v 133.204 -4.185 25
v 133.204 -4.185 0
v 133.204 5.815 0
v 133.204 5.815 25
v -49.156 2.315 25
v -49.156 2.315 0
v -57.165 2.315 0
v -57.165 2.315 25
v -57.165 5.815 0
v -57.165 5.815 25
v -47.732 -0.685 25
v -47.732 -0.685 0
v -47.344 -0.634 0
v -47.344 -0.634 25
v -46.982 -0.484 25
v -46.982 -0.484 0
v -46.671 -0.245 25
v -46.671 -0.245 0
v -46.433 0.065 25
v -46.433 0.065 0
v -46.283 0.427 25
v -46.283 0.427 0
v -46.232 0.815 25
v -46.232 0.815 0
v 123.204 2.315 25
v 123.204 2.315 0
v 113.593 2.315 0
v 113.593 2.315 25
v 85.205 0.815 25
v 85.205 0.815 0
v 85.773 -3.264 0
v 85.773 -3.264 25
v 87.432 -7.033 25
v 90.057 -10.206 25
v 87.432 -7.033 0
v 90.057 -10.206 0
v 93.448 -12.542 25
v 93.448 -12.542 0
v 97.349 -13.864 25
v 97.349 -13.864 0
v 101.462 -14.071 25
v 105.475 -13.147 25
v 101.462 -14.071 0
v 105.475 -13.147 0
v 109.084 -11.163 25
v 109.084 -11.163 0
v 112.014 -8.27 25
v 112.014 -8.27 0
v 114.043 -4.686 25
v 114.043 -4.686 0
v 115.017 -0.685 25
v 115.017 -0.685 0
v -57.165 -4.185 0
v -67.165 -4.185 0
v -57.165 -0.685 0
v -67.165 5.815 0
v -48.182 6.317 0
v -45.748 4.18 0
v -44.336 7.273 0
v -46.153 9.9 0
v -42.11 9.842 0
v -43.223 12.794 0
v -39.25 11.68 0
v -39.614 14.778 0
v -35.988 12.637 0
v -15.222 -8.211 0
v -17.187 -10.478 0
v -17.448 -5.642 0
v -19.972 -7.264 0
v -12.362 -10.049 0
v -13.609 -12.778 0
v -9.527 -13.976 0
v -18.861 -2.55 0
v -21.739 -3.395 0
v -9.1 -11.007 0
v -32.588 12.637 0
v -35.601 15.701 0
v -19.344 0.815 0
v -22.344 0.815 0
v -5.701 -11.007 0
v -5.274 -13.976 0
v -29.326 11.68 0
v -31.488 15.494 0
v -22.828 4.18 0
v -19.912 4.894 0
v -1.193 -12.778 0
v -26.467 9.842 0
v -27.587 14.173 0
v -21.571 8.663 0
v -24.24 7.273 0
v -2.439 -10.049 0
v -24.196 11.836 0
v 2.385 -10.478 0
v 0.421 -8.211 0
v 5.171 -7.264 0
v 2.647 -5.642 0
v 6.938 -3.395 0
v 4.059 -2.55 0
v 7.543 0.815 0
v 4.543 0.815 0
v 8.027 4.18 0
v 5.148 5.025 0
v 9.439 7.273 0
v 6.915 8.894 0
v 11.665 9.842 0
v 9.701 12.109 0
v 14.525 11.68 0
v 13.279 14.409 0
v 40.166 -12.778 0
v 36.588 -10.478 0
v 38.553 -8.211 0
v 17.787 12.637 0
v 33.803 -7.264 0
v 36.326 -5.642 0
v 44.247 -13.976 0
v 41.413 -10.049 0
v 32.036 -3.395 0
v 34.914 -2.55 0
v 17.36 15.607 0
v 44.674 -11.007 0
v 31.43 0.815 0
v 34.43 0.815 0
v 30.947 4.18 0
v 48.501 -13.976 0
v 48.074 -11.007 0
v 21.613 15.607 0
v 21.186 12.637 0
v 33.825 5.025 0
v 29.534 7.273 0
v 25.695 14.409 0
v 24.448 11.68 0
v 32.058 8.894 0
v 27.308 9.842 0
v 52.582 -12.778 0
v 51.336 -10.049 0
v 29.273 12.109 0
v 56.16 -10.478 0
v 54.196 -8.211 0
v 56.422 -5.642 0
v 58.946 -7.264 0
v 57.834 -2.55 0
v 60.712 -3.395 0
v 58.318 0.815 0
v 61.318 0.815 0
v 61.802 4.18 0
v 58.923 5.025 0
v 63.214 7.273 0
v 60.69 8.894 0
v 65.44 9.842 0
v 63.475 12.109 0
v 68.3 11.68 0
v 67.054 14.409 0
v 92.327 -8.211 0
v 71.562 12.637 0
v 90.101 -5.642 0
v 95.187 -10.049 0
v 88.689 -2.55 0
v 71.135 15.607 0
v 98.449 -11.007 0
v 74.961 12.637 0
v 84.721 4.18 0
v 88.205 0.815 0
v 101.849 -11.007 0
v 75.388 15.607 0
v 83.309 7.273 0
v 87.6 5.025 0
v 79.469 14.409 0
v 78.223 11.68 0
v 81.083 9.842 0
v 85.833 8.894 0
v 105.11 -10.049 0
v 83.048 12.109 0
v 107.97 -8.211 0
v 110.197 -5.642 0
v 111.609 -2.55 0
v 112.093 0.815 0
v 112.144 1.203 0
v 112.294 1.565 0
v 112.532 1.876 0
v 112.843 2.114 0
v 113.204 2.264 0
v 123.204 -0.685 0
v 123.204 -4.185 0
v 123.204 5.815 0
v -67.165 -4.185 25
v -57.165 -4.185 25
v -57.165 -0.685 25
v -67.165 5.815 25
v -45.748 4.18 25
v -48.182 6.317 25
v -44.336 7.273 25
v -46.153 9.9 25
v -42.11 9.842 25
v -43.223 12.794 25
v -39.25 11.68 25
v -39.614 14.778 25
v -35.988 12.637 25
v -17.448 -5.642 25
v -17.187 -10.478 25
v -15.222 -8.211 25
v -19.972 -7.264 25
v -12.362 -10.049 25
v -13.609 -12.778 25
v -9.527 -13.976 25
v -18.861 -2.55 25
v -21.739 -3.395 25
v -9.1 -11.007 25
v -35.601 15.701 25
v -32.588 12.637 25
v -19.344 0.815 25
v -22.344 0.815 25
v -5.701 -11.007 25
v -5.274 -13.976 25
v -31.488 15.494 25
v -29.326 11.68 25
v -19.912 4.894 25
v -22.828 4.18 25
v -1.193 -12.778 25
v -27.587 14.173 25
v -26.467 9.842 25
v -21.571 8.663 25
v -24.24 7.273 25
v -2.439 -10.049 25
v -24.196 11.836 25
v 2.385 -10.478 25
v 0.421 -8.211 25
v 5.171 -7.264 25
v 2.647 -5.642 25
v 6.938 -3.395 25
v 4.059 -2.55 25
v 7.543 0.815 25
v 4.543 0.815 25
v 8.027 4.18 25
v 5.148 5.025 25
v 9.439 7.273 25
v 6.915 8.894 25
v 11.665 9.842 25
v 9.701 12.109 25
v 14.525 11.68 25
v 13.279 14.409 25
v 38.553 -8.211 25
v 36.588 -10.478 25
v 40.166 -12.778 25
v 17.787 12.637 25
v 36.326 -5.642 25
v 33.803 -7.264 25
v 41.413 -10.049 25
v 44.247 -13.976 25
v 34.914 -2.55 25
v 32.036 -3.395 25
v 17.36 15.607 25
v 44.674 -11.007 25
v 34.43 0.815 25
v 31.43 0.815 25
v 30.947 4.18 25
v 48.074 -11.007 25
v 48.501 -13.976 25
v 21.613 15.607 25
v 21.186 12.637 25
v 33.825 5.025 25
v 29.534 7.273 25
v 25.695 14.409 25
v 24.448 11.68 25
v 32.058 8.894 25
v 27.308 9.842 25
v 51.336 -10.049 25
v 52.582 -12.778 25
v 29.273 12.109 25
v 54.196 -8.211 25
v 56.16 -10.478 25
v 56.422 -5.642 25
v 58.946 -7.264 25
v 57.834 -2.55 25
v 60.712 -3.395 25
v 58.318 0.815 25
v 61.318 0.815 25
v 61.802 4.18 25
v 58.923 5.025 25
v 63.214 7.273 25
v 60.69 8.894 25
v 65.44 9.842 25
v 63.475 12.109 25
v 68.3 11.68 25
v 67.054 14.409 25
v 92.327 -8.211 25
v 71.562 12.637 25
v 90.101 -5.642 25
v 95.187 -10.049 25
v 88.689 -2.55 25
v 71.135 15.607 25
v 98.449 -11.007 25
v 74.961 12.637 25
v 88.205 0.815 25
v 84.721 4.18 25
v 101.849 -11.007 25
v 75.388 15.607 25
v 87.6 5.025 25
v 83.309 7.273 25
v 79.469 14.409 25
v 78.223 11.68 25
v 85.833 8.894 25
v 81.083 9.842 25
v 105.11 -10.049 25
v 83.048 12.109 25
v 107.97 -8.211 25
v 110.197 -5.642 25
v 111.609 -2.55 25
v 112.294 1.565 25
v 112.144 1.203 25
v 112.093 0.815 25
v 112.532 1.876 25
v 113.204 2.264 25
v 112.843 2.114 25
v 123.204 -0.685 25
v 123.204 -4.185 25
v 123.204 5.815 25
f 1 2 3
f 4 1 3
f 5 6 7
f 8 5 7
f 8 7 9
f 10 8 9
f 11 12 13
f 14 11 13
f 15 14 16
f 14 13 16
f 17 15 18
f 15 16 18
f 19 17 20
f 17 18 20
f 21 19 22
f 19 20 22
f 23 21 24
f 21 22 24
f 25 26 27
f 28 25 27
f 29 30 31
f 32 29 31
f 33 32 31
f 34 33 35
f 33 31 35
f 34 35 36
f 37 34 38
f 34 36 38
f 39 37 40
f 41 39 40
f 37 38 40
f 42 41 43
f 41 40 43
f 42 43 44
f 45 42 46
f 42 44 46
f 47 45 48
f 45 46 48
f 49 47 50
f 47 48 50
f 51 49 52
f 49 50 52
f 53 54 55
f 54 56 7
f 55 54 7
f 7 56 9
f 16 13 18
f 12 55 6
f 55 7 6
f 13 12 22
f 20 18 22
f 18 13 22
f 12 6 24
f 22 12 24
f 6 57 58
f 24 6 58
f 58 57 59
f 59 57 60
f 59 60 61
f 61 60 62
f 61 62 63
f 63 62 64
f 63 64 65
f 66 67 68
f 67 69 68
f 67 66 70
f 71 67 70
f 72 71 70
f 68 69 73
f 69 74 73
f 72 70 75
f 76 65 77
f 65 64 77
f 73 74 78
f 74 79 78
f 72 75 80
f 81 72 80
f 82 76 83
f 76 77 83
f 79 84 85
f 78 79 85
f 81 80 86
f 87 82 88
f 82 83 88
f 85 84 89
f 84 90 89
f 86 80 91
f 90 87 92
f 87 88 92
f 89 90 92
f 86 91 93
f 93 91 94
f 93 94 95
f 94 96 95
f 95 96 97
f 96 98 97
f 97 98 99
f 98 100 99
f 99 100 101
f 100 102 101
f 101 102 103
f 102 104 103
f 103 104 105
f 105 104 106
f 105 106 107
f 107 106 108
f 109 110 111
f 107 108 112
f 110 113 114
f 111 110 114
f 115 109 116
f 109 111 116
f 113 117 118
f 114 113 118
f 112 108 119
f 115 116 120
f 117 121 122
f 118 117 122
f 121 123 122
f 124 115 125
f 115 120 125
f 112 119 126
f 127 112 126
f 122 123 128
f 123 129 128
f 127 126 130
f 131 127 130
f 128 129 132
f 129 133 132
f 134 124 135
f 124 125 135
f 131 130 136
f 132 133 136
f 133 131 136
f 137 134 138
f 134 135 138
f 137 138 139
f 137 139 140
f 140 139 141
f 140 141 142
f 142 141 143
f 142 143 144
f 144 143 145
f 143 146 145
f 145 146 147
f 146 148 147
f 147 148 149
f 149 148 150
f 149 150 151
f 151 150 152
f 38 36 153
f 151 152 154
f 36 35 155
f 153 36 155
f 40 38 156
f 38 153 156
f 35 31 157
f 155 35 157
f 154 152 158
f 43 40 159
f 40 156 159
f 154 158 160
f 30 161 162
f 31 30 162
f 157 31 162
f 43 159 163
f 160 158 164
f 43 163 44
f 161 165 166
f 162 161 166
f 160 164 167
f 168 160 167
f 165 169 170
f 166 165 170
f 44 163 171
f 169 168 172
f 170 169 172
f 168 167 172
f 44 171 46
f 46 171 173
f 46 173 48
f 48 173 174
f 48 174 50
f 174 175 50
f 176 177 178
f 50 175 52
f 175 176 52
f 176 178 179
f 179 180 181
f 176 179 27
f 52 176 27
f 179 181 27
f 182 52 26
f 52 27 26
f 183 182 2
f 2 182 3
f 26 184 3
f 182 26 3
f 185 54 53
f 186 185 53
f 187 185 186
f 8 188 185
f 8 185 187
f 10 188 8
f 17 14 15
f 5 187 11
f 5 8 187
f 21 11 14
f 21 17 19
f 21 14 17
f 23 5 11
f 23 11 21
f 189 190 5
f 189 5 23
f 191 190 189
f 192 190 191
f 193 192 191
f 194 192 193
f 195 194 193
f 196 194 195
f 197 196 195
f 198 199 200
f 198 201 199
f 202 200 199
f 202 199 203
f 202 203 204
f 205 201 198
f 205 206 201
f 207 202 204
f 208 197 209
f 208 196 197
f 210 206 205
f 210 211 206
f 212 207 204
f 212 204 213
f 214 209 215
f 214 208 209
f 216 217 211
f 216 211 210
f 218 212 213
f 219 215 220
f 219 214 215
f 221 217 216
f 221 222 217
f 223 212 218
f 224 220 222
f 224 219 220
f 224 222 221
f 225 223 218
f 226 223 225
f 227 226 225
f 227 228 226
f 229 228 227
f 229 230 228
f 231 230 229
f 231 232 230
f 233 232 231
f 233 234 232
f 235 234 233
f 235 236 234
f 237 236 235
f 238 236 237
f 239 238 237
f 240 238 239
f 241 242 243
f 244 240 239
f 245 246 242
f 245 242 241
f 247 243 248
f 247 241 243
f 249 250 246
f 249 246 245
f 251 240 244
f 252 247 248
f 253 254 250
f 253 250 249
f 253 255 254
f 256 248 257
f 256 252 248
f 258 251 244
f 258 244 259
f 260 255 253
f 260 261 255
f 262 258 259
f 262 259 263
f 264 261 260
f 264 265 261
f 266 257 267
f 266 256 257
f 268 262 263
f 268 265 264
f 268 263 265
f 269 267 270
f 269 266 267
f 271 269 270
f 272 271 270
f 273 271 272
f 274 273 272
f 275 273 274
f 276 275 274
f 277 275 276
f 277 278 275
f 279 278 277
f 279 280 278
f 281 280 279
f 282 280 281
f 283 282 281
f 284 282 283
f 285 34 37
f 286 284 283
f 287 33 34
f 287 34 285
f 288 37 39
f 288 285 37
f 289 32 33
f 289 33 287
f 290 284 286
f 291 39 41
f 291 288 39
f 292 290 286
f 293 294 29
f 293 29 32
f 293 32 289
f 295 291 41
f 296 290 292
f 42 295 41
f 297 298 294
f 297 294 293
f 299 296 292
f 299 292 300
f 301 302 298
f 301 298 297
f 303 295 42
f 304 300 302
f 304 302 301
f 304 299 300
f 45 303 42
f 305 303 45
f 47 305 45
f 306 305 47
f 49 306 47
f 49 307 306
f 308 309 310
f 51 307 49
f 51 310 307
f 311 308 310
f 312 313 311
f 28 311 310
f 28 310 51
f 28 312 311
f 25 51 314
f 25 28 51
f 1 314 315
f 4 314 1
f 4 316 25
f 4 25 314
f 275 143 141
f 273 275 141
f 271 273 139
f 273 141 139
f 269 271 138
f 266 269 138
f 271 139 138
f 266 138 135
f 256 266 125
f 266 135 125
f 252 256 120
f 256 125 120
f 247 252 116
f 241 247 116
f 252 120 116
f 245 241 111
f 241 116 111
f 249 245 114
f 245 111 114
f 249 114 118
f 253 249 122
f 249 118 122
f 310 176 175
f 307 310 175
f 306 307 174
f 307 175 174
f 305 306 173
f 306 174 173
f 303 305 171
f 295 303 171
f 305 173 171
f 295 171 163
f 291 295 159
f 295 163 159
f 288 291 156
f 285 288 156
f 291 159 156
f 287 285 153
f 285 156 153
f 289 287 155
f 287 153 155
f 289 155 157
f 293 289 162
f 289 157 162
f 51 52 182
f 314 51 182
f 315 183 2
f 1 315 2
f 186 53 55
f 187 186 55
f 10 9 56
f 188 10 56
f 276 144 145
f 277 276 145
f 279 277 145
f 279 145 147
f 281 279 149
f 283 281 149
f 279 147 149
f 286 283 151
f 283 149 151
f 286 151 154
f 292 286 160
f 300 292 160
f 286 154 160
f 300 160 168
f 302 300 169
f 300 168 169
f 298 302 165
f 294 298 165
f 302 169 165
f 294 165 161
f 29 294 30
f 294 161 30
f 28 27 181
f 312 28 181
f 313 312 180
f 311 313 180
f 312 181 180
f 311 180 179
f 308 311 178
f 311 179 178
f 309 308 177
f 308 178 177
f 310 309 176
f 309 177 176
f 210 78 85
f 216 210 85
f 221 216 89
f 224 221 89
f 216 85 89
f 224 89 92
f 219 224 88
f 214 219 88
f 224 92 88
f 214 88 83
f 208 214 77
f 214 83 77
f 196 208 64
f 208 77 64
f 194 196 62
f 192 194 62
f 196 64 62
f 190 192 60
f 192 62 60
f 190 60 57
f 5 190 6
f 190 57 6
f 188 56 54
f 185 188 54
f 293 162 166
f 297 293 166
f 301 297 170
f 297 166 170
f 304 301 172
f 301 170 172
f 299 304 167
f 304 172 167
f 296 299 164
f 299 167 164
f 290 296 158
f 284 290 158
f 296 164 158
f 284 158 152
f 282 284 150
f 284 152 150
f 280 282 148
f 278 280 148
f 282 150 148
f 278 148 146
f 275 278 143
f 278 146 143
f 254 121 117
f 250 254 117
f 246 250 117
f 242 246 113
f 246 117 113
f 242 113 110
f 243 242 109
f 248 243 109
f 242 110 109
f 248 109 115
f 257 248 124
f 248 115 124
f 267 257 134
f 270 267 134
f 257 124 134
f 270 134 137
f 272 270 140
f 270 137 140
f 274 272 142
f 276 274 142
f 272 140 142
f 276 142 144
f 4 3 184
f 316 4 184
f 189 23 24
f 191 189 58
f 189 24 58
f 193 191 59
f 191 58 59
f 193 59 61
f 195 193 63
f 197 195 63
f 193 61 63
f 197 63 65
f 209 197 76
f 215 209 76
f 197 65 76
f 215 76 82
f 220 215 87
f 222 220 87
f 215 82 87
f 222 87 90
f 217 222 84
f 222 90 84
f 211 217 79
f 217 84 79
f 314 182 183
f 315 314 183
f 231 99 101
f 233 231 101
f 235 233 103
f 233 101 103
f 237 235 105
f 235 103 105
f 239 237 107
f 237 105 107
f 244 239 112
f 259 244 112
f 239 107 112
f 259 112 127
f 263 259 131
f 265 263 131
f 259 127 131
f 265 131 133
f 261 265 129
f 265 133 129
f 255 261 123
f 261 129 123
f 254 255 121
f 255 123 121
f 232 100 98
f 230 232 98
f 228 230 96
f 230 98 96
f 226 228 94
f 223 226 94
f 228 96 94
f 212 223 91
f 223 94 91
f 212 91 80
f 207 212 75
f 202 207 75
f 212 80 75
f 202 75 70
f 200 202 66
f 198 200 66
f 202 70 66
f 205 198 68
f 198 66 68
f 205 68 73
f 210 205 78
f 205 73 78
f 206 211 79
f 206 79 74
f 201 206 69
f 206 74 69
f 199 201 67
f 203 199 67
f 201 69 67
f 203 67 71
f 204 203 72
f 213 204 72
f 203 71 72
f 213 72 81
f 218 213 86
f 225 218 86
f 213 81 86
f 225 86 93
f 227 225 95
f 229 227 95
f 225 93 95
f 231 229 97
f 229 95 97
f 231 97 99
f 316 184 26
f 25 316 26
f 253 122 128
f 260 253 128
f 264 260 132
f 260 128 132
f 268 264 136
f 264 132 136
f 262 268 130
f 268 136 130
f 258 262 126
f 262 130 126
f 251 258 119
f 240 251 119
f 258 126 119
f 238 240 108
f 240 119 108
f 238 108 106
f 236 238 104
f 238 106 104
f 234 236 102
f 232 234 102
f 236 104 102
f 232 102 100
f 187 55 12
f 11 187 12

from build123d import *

# Parameters (mm, degrees)
F1_DEPTH = 25


with BuildPart() as f1:
    # F0 (on Top) → F1 (new body)
    with BuildSketch(Plane.XY):
        with BuildLine():
            ThreePointArc((-49.1562802567, 2.3152595113), (-49.2128732163, 1.5662082781), (-49.2317534387, 0.8152595113))
            Line((-49.2317534387, 0.8152595113), (-47.7317534387, 0.8152595113))
            ThreePointArc((-47.7317534387, 0.8152595113), (-47.7108165454, 1.5652595113), (-47.6480710788, 2.3129234465))
            ThreePointArc((-47.6480710788, 2.3129234465), (-47.6898959586, 2.3146753814), (-47.7317534387, 2.3152595113))
            Line((-47.7317534387, 2.3152595113), (-49.1562802567, 2.3152595113))
        make_face()
        with BuildLine():
            Line((-47.7317534387, 0.8152595113), (-49.2317534387, 0.8152595113))
            ThreePointArc((-49.2317534387, 0.8152595113), (-48.7924136105, -0.2454006604), (-47.7317534387, -0.6847404887))
            ThreePointArc((-47.7317534387, -0.6847404887), (-46.6710932669, -0.2454006604), (-46.2317534387, 0.8152595113))
            ThreePointArc((-46.2317534387, 0.8152595113), (-46.6419086012, 1.8459089328), (-47.6480710788, 2.3129234465))
            ThreePointArc((-47.6480710788, 2.3129234465), (-47.7108165454, 1.5652595113), (-47.7317534387, 0.8152595113))
        make_face()
        with BuildLine():
            ThreePointArc((-47.7317534387, -0.6847404887), (-48.7924136105, -0.2454006604), (-49.2317534387, 0.8152595113))
            ThreePointArc((-49.2317534387, 0.8152595113), (-49.2128732163, 1.5662082781), (-49.1562802567, 2.3152595113))
            Line((-49.1562802567, 2.3152595113), (-57.1654987335, 2.3152595113))
            Line((-57.1654987335, 2.3152595113), (-57.1654987335, 5.8152595113))
            Line((-57.1654987335, 5.8152595113), (-67.1654987335, 5.8152595113))
            Line((-67.1654987335, 5.8152595113), (-67.1654987335, -4.1847404887))
            Line((-67.1654987335, -4.1847404887), (-57.1654987335, -4.1847404887))
            Line((-57.1654987335, -4.1847404887), (-57.1654987335, -0.6847404887))
            Line((-57.1654987335, -0.6847404887), (-47.7317534387, -0.6847404887))
        make_face()
        with BuildLine():
            ThreePointArc((-19.3443664014, 0.8152595113), (-33.5371111533, 15.7400728076), (-49.1562802567, 2.3152595113))
            Line((-49.1562802567, 2.3152595113), (-47.7317534387, 2.3152595113))
            ThreePointArc((-47.7317534387, 2.3152595113), (-47.6898959586, 2.3146753814), (-47.6480710788, 2.3129234465))
            ThreePointArc((-47.6480710788, 2.3129234465), (-34.2880599201, 14.25895303), (-20.9280487614, 2.3129234465))
            ThreePointArc((-20.9280487614, 2.3129234465), (-19.8137169799, 1.9051043489), (-19.3443664014, 0.8152595113))
        make_face()
        with BuildLine():
            ThreePointArc((-20.9280487614, 2.3129234465), (-34.2880599201, 14.25895303), (-47.6480710788, 2.3129234465))
            ThreePointArc((-47.6480710788, 2.3129234465), (-46.6419086012, 1.8459089328), (-46.2317534387, 0.8152595113))
            ThreePointArc((-46.2317534387, 0.8152595113), (-34.2880599201, 12.75895303), (-22.3443664014, 0.8152595113))
            ThreePointArc((-22.3443664014, 0.8152595113), (-21.934211239, 1.8459089328), (-20.9280487614, 2.3129234465))
        make_face()
        with BuildLine():
            ThreePointArc((4.5430206358, 0.8152595113), (-7.4006728828, -11.1284340073), (-19.3443664014, 0.8152595113))
            ThreePointArc((-19.3443664014, 0.8152595113), (-19.7545215639, -0.2153899102), (-20.7606840415, -0.6824044238))
            ThreePointArc((-20.7606840415, -0.6824044238), (-7.4006728828, -12.6284340073), (5.9593382759, -0.6824044238))
            ThreePointArc((5.9593382759, -0.6824044238), (4.9531757983, -0.2153899102), (4.5430206358, 0.8152595113))
        make_face()
        with BuildLine():
            ThreePointArc((-20.7606840415, -0.6824044238), (-19.7545215639, -0.2153899102), (-19.3443664014, 0.8152595113))
            ThreePointArc((-19.3443664014, 0.8152595113), (-19.8137169799, 1.9051043489), (-20.9280487614, 2.3129234465))
            ThreePointArc((-20.9280487614, 2.3129234465), (-20.8653032947, 1.5652595113), (-20.8443664014, 0.8152595113))
            ThreePointArc((-20.8443664014, 0.8152595113), (-20.8234295081, 0.0652595113), (-20.7606840415, -0.6824044238))
        make_face()
        with BuildLine():
            ThreePointArc((-20.8443664014, 0.8152595113), (-20.8653032947, 1.5652595113), (-20.9280487614, 2.3129234465))
            ThreePointArc((-20.9280487614, 2.3129234465), (-21.934211239, 1.8459089328), (-22.3443664014, 0.8152595113))
            ThreePointArc((-22.3443664014, 0.8152595113), (-21.8750158229, -0.2745853262), (-20.7606840415, -0.6824044238))
            ThreePointArc((-20.7606840415, -0.6824044238), (-20.8234295081, 0.0652595113), (-20.8443664014, 0.8152595113))
        make_face()
        with BuildLine():
            ThreePointArc((-20.7606840415, -0.6824044238), (-21.8750158229, -0.2745853262), (-22.3443664014, 0.8152595113))
            ThreePointArc((-22.3443664014, 0.8152595113), (-7.4006728828, -14.1284340073), (7.5430206358, 0.8152595113))
            ThreePointArc((7.5430206358, 0.8152595113), (7.0736700573, -0.2745853262), (5.9593382759, -0.6824044238))
            ThreePointArc((5.9593382759, -0.6824044238), (-7.4006728828, -12.6284340073), (-20.7606840415, -0.6824044238))
        make_face()
        with BuildLine():
            ThreePointArc((6.1267029958, 2.3129234465), (5.0123712143, 1.9051043489), (4.5430206358, 0.8152595113))
            ThreePointArc((4.5430206358, 0.8152595113), (4.9531757983, -0.2153899102), (5.9593382759, -0.6824044238))
            ThreePointArc((5.9593382759, -0.6824044238), (6.0220837425, 0.0652595113), (6.0430206358, 0.8152595113))
            ThreePointArc((6.0430206358, 0.8152595113), (6.0639575291, 1.5652595113), (6.1267029958, 2.3129234465))
        make_face()
        with BuildLine():
            ThreePointArc((34.4304076731, 0.8152595113), (19.4867141545, 15.75895303), (4.5430206358, 0.8152595113))
            ThreePointArc((4.5430206358, 0.8152595113), (5.0123712143, 1.9051043489), (6.1267029958, 2.3129234465))
            ThreePointArc((6.1267029958, 2.3129234465), (19.4867141545, 14.25895303), (32.8467253132, 2.3129234465))
            ThreePointArc((32.8467253132, 2.3129234465), (33.9610570946, 1.9051043489), (34.4304076731, 0.8152595113))
        make_face()
        with BuildLine():
            ThreePointArc((6.1267029958, 2.3129234465), (7.1328654734, 1.8459089328), (7.5430206358, 0.8152595113))
            ThreePointArc((7.5430206358, 0.8152595113), (19.4867141545, 12.75895303), (31.4304076731, 0.8152595113))
            ThreePointArc((31.4304076731, 0.8152595113), (31.8405628356, 1.8459089328), (32.8467253132, 2.3129234465))
            ThreePointArc((32.8467253132, 2.3129234465), (19.4867141545, 14.25895303), (6.1267029958, 2.3129234465))
        make_face()
        with BuildLine():
            ThreePointArc((5.9593382759, -0.6824044238), (7.0736700573, -0.2745853262), (7.5430206358, 0.8152595113))
            ThreePointArc((7.5430206358, 0.8152595113), (7.1328654734, 1.8459089328), (6.1267029958, 2.3129234465))
            ThreePointArc((6.1267029958, 2.3129234465), (6.0639575291, 1.5652595113), (6.0430206358, 0.8152595113))
            ThreePointArc((6.0430206358, 0.8152595113), (6.0220837425, 0.0652595113), (5.9593382759, -0.6824044238))
        make_face()
        with BuildLine():
            ThreePointArc((58.3177947104, 0.8152595113), (46.3741011918, -11.1284340073), (34.4304076731, 0.8152595113))
            ThreePointArc((34.4304076731, 0.8152595113), (34.0202525107, -0.2153899102), (33.0140900331, -0.6824044238))
            ThreePointArc((33.0140900331, -0.6824044238), (46.3741011918, -12.6284340073), (59.7341123505, -0.6824044238))
            ThreePointArc((59.7341123505, -0.6824044238), (58.7279498728, -0.2153899102), (58.3177947104, 0.8152595113))
        make_face()
        with BuildLine():
            ThreePointArc((33.0140900331, -0.6824044238), (34.0202525107, -0.2153899102), (34.4304076731, 0.8152595113))
            ThreePointArc((34.4304076731, 0.8152595113), (33.9610570946, 1.9051043489), (32.8467253132, 2.3129234465))
            ThreePointArc((32.8467253132, 2.3129234465), (32.9094707798, 1.5652595113), (32.9304076731, 0.8152595113))
            ThreePointArc((32.9304076731, 0.8152595113), (32.9513445664, 0.0652595113), (33.0140900331, -0.6824044238))
        make_face()
        with BuildLine():
            ThreePointArc((32.8467253132, 2.3129234465), (31.8405628356, 1.8459089328), (31.4304076731, 0.8152595113))
            ThreePointArc((31.4304076731, 0.8152595113), (31.8997582516, -0.2745853262), (33.0140900331, -0.6824044238))
            ThreePointArc((33.0140900331, -0.6824044238), (32.9513445664, 0.0652595113), (32.9304076731, 0.8152595113))
            ThreePointArc((32.9304076731, 0.8152595113), (32.9094707798, 1.5652595113), (32.8467253132, 2.3129234465))
        make_face()
        with BuildLine():
            ThreePointArc((33.0140900331, -0.6824044238), (31.8997582516, -0.2745853262), (31.4304076731, 0.8152595113))
            ThreePointArc((31.4304076731, 0.8152595113), (46.3741011918, -14.1284340073), (61.3177947104, 0.8152595113))
            ThreePointArc((61.3177947104, 0.8152595113), (60.8484441319, -0.2745853262), (59.7341123505, -0.6824044238))
            ThreePointArc((59.7341123505, -0.6824044238), (46.3741011918, -12.6284340073), (33.0140900331, -0.6824044238))
        make_face()
        with BuildLine():
            ThreePointArc((59.9014770703, 2.3129234465), (58.7871452889, 1.9051043489), (58.3177947104, 0.8152595113))
            ThreePointArc((58.3177947104, 0.8152595113), (58.7279498728, -0.2153899102), (59.7341123505, -0.6824044238))
            ThreePointArc((59.7341123505, -0.6824044238), (59.7968578171, 0.0652595113), (59.8177947104, 0.8152595113))
            ThreePointArc((59.8177947104, 0.8152595113), (59.8387316037, 1.5652595113), (59.9014770703, 2.3129234465))
        make_face()
        with BuildLine():
            ThreePointArc((88.2051817477, 0.8152595113), (73.261488229, 15.75895303), (58.3177947104, 0.8152595113))
            ThreePointArc((58.3177947104, 0.8152595113), (58.7871452889, 1.9051043489), (59.9014770703, 2.3129234465))
            ThreePointArc((59.9014770703, 2.3129234465), (73.261488229, 14.25895303), (86.6214993877, 2.3129234465))
            ThreePointArc((86.6214993877, 2.3129234465), (87.7358311692, 1.9051043489), (88.2051817477, 0.8152595113))
        make_face()
        with BuildLine():
            ThreePointArc((59.9014770703, 2.3129234465), (60.907639548, 1.8459089328), (61.3177947104, 0.8152595113))
            ThreePointArc((61.3177947104, 0.8152595113), (73.261488229, 12.75895303), (85.2051817477, 0.8152595113))
            ThreePointArc((85.2051817477, 0.8152595113), (85.6153369101, 1.8459089328), (86.6214993877, 2.3129234465))
            ThreePointArc((86.6214993877, 2.3129234465), (73.261488229, 14.25895303), (59.9014770703, 2.3129234465))
        make_face()
        with BuildLine():
            ThreePointArc((59.7341123505, -0.6824044238), (60.8484441319, -0.2745853262), (61.3177947104, 0.8152595113))
            ThreePointArc((61.3177947104, 0.8152595113), (60.907639548, 1.8459089328), (59.9014770703, 2.3129234465))
            ThreePointArc((59.9014770703, 2.3129234465), (59.8387316037, 1.5652595113), (59.8177947104, 0.8152595113))
            ThreePointArc((59.8177947104, 0.8152595113), (59.7968578171, 0.0652595113), (59.7341123505, -0.6824044238))
        make_face()
        with BuildLine():
            ThreePointArc((112.092568785, 0.8152595113), (100.1488752663, -11.1284340073), (88.2051817477, 0.8152595113))
            ThreePointArc((88.2051817477, 0.8152595113), (87.7950265852, -0.2153899102), (86.7888641076, -0.6824044238))
            ThreePointArc((86.7888641076, -0.6824044238), (100.1488752663, -12.6284340073), (113.508886425, -0.6824044238))
            ThreePointArc((113.508886425, -0.6824044238), (112.5027239474, -0.2153899102), (112.092568785, 0.8152595113))
        make_face()
        with BuildLine():
            ThreePointArc((86.7888641076, -0.6824044238), (87.7950265852, -0.2153899102), (88.2051817477, 0.8152595113))
            ThreePointArc((88.2051817477, 0.8152595113), (87.7358311692, 1.9051043489), (86.6214993877, 2.3129234465))
            ThreePointArc((86.6214993877, 2.3129234465), (86.6842448544, 1.5652595113), (86.7051817477, 0.8152595113))
            ThreePointArc((86.7051817477, 0.8152595113), (86.726118641, 0.0652595113), (86.7888641076, -0.6824044238))
        make_face()
        with BuildLine():
            ThreePointArc((86.6214993877, 2.3129234465), (85.6153369101, 1.8459089328), (85.2051817477, 0.8152595113))
            ThreePointArc((85.2051817477, 0.8152595113), (85.6745323262, -0.2745853262), (86.7888641076, -0.6824044238))
            ThreePointArc((86.7888641076, -0.6824044238), (86.726118641, 0.0652595113), (86.7051817477, 0.8152595113))
            ThreePointArc((86.7051817477, 0.8152595113), (86.6842448544, 1.5652595113), (86.6214993877, 2.3129234465))
        make_face()
        with BuildLine():
            ThreePointArc((86.7888641076, -0.6824044238), (85.6745323262, -0.2745853262), (85.2051817477, 0.8152595113))
            ThreePointArc((85.2051817477, 0.8152595113), (99.3979264996, -14.1095537849), (115.017095603, -0.6847404887))
            Line((115.017095603, -0.6847404887), (113.592568785, -0.6847404887))
            ThreePointArc((113.592568785, -0.6847404887), (113.5507113048, -0.6841563587), (113.508886425, -0.6824044238))
            ThreePointArc((113.508886425, -0.6824044238), (100.1488752663, -12.6284340073), (86.7888641076, -0.6824044238))
        make_face()
        with BuildLine():
            ThreePointArc((113.592568785, 2.3152595113), (112.5319086132, 1.8759196831), (112.092568785, 0.8152595113))
            ThreePointArc((112.092568785, 0.8152595113), (112.5027239474, -0.2153899102), (113.508886425, -0.6824044238))
            ThreePointArc((113.508886425, -0.6824044238), (113.5716318917, 0.0652595113), (113.592568785, 0.8152595113))
            Line((113.592568785, 0.8152595113), (115.092568785, 0.8152595113))
            ThreePointArc((115.092568785, 0.8152595113), (114.6532289567, 1.8759196831), (113.592568785, 2.3152595113))
        make_face()
        with BuildLine():
            ThreePointArc((115.092568785, 0.8152595113), (115.0736885626, 0.0643107446), (115.017095603, -0.6847404887))
            Line((115.017095603, -0.6847404887), (123.2039433718, -0.6847404887))
            Line((123.2039433718, -0.6847404887), (123.2039433718, 0.8152595113))
            Line((123.2039433718, 0.8152595113), (115.092568785, 0.8152595113))
        make_face()
        with BuildLine():
            Line((113.592568785, -0.6847404887), (115.017095603, -0.6847404887))
            ThreePointArc((115.017095603, -0.6847404887), (115.0736885626, 0.0643107446), (115.092568785, 0.8152595113))
            Line((115.092568785, 0.8152595113), (113.592568785, 0.8152595113))
            ThreePointArc((113.592568785, 0.8152595113), (113.5716318917, 0.0652595113), (113.508886425, -0.6824044238))
            ThreePointArc((113.508886425, -0.6824044238), (113.5507113048, -0.6841563587), (113.592568785, -0.6847404887))
        make_face()
        with BuildLine():
            Line((123.2039433718, 2.3152595113), (113.592568785, 2.3152595113))
            ThreePointArc((113.592568785, 2.3152595113), (114.6532289567, 1.8759196831), (115.092568785, 0.8152595113))
            Line((115.092568785, 0.8152595113), (123.2039433718, 0.8152595113))
            Line((123.2039433718, 0.8152595113), (123.2039433718, 2.3152595113))
        make_face()
        Polygon((123.2039433718, 0.8152595113), (123.2039433718, -0.6847404887), (123.2039433718, -4.1847404887), (133.2039433718, -4.1847404887), (133.2039433718, 5.8152595113), (123.2039433718, 5.8152595113), (123.2039433718, 2.3152595113), align=None)
    extrude(amount=F1_DEPTH)


solid = f1.part
